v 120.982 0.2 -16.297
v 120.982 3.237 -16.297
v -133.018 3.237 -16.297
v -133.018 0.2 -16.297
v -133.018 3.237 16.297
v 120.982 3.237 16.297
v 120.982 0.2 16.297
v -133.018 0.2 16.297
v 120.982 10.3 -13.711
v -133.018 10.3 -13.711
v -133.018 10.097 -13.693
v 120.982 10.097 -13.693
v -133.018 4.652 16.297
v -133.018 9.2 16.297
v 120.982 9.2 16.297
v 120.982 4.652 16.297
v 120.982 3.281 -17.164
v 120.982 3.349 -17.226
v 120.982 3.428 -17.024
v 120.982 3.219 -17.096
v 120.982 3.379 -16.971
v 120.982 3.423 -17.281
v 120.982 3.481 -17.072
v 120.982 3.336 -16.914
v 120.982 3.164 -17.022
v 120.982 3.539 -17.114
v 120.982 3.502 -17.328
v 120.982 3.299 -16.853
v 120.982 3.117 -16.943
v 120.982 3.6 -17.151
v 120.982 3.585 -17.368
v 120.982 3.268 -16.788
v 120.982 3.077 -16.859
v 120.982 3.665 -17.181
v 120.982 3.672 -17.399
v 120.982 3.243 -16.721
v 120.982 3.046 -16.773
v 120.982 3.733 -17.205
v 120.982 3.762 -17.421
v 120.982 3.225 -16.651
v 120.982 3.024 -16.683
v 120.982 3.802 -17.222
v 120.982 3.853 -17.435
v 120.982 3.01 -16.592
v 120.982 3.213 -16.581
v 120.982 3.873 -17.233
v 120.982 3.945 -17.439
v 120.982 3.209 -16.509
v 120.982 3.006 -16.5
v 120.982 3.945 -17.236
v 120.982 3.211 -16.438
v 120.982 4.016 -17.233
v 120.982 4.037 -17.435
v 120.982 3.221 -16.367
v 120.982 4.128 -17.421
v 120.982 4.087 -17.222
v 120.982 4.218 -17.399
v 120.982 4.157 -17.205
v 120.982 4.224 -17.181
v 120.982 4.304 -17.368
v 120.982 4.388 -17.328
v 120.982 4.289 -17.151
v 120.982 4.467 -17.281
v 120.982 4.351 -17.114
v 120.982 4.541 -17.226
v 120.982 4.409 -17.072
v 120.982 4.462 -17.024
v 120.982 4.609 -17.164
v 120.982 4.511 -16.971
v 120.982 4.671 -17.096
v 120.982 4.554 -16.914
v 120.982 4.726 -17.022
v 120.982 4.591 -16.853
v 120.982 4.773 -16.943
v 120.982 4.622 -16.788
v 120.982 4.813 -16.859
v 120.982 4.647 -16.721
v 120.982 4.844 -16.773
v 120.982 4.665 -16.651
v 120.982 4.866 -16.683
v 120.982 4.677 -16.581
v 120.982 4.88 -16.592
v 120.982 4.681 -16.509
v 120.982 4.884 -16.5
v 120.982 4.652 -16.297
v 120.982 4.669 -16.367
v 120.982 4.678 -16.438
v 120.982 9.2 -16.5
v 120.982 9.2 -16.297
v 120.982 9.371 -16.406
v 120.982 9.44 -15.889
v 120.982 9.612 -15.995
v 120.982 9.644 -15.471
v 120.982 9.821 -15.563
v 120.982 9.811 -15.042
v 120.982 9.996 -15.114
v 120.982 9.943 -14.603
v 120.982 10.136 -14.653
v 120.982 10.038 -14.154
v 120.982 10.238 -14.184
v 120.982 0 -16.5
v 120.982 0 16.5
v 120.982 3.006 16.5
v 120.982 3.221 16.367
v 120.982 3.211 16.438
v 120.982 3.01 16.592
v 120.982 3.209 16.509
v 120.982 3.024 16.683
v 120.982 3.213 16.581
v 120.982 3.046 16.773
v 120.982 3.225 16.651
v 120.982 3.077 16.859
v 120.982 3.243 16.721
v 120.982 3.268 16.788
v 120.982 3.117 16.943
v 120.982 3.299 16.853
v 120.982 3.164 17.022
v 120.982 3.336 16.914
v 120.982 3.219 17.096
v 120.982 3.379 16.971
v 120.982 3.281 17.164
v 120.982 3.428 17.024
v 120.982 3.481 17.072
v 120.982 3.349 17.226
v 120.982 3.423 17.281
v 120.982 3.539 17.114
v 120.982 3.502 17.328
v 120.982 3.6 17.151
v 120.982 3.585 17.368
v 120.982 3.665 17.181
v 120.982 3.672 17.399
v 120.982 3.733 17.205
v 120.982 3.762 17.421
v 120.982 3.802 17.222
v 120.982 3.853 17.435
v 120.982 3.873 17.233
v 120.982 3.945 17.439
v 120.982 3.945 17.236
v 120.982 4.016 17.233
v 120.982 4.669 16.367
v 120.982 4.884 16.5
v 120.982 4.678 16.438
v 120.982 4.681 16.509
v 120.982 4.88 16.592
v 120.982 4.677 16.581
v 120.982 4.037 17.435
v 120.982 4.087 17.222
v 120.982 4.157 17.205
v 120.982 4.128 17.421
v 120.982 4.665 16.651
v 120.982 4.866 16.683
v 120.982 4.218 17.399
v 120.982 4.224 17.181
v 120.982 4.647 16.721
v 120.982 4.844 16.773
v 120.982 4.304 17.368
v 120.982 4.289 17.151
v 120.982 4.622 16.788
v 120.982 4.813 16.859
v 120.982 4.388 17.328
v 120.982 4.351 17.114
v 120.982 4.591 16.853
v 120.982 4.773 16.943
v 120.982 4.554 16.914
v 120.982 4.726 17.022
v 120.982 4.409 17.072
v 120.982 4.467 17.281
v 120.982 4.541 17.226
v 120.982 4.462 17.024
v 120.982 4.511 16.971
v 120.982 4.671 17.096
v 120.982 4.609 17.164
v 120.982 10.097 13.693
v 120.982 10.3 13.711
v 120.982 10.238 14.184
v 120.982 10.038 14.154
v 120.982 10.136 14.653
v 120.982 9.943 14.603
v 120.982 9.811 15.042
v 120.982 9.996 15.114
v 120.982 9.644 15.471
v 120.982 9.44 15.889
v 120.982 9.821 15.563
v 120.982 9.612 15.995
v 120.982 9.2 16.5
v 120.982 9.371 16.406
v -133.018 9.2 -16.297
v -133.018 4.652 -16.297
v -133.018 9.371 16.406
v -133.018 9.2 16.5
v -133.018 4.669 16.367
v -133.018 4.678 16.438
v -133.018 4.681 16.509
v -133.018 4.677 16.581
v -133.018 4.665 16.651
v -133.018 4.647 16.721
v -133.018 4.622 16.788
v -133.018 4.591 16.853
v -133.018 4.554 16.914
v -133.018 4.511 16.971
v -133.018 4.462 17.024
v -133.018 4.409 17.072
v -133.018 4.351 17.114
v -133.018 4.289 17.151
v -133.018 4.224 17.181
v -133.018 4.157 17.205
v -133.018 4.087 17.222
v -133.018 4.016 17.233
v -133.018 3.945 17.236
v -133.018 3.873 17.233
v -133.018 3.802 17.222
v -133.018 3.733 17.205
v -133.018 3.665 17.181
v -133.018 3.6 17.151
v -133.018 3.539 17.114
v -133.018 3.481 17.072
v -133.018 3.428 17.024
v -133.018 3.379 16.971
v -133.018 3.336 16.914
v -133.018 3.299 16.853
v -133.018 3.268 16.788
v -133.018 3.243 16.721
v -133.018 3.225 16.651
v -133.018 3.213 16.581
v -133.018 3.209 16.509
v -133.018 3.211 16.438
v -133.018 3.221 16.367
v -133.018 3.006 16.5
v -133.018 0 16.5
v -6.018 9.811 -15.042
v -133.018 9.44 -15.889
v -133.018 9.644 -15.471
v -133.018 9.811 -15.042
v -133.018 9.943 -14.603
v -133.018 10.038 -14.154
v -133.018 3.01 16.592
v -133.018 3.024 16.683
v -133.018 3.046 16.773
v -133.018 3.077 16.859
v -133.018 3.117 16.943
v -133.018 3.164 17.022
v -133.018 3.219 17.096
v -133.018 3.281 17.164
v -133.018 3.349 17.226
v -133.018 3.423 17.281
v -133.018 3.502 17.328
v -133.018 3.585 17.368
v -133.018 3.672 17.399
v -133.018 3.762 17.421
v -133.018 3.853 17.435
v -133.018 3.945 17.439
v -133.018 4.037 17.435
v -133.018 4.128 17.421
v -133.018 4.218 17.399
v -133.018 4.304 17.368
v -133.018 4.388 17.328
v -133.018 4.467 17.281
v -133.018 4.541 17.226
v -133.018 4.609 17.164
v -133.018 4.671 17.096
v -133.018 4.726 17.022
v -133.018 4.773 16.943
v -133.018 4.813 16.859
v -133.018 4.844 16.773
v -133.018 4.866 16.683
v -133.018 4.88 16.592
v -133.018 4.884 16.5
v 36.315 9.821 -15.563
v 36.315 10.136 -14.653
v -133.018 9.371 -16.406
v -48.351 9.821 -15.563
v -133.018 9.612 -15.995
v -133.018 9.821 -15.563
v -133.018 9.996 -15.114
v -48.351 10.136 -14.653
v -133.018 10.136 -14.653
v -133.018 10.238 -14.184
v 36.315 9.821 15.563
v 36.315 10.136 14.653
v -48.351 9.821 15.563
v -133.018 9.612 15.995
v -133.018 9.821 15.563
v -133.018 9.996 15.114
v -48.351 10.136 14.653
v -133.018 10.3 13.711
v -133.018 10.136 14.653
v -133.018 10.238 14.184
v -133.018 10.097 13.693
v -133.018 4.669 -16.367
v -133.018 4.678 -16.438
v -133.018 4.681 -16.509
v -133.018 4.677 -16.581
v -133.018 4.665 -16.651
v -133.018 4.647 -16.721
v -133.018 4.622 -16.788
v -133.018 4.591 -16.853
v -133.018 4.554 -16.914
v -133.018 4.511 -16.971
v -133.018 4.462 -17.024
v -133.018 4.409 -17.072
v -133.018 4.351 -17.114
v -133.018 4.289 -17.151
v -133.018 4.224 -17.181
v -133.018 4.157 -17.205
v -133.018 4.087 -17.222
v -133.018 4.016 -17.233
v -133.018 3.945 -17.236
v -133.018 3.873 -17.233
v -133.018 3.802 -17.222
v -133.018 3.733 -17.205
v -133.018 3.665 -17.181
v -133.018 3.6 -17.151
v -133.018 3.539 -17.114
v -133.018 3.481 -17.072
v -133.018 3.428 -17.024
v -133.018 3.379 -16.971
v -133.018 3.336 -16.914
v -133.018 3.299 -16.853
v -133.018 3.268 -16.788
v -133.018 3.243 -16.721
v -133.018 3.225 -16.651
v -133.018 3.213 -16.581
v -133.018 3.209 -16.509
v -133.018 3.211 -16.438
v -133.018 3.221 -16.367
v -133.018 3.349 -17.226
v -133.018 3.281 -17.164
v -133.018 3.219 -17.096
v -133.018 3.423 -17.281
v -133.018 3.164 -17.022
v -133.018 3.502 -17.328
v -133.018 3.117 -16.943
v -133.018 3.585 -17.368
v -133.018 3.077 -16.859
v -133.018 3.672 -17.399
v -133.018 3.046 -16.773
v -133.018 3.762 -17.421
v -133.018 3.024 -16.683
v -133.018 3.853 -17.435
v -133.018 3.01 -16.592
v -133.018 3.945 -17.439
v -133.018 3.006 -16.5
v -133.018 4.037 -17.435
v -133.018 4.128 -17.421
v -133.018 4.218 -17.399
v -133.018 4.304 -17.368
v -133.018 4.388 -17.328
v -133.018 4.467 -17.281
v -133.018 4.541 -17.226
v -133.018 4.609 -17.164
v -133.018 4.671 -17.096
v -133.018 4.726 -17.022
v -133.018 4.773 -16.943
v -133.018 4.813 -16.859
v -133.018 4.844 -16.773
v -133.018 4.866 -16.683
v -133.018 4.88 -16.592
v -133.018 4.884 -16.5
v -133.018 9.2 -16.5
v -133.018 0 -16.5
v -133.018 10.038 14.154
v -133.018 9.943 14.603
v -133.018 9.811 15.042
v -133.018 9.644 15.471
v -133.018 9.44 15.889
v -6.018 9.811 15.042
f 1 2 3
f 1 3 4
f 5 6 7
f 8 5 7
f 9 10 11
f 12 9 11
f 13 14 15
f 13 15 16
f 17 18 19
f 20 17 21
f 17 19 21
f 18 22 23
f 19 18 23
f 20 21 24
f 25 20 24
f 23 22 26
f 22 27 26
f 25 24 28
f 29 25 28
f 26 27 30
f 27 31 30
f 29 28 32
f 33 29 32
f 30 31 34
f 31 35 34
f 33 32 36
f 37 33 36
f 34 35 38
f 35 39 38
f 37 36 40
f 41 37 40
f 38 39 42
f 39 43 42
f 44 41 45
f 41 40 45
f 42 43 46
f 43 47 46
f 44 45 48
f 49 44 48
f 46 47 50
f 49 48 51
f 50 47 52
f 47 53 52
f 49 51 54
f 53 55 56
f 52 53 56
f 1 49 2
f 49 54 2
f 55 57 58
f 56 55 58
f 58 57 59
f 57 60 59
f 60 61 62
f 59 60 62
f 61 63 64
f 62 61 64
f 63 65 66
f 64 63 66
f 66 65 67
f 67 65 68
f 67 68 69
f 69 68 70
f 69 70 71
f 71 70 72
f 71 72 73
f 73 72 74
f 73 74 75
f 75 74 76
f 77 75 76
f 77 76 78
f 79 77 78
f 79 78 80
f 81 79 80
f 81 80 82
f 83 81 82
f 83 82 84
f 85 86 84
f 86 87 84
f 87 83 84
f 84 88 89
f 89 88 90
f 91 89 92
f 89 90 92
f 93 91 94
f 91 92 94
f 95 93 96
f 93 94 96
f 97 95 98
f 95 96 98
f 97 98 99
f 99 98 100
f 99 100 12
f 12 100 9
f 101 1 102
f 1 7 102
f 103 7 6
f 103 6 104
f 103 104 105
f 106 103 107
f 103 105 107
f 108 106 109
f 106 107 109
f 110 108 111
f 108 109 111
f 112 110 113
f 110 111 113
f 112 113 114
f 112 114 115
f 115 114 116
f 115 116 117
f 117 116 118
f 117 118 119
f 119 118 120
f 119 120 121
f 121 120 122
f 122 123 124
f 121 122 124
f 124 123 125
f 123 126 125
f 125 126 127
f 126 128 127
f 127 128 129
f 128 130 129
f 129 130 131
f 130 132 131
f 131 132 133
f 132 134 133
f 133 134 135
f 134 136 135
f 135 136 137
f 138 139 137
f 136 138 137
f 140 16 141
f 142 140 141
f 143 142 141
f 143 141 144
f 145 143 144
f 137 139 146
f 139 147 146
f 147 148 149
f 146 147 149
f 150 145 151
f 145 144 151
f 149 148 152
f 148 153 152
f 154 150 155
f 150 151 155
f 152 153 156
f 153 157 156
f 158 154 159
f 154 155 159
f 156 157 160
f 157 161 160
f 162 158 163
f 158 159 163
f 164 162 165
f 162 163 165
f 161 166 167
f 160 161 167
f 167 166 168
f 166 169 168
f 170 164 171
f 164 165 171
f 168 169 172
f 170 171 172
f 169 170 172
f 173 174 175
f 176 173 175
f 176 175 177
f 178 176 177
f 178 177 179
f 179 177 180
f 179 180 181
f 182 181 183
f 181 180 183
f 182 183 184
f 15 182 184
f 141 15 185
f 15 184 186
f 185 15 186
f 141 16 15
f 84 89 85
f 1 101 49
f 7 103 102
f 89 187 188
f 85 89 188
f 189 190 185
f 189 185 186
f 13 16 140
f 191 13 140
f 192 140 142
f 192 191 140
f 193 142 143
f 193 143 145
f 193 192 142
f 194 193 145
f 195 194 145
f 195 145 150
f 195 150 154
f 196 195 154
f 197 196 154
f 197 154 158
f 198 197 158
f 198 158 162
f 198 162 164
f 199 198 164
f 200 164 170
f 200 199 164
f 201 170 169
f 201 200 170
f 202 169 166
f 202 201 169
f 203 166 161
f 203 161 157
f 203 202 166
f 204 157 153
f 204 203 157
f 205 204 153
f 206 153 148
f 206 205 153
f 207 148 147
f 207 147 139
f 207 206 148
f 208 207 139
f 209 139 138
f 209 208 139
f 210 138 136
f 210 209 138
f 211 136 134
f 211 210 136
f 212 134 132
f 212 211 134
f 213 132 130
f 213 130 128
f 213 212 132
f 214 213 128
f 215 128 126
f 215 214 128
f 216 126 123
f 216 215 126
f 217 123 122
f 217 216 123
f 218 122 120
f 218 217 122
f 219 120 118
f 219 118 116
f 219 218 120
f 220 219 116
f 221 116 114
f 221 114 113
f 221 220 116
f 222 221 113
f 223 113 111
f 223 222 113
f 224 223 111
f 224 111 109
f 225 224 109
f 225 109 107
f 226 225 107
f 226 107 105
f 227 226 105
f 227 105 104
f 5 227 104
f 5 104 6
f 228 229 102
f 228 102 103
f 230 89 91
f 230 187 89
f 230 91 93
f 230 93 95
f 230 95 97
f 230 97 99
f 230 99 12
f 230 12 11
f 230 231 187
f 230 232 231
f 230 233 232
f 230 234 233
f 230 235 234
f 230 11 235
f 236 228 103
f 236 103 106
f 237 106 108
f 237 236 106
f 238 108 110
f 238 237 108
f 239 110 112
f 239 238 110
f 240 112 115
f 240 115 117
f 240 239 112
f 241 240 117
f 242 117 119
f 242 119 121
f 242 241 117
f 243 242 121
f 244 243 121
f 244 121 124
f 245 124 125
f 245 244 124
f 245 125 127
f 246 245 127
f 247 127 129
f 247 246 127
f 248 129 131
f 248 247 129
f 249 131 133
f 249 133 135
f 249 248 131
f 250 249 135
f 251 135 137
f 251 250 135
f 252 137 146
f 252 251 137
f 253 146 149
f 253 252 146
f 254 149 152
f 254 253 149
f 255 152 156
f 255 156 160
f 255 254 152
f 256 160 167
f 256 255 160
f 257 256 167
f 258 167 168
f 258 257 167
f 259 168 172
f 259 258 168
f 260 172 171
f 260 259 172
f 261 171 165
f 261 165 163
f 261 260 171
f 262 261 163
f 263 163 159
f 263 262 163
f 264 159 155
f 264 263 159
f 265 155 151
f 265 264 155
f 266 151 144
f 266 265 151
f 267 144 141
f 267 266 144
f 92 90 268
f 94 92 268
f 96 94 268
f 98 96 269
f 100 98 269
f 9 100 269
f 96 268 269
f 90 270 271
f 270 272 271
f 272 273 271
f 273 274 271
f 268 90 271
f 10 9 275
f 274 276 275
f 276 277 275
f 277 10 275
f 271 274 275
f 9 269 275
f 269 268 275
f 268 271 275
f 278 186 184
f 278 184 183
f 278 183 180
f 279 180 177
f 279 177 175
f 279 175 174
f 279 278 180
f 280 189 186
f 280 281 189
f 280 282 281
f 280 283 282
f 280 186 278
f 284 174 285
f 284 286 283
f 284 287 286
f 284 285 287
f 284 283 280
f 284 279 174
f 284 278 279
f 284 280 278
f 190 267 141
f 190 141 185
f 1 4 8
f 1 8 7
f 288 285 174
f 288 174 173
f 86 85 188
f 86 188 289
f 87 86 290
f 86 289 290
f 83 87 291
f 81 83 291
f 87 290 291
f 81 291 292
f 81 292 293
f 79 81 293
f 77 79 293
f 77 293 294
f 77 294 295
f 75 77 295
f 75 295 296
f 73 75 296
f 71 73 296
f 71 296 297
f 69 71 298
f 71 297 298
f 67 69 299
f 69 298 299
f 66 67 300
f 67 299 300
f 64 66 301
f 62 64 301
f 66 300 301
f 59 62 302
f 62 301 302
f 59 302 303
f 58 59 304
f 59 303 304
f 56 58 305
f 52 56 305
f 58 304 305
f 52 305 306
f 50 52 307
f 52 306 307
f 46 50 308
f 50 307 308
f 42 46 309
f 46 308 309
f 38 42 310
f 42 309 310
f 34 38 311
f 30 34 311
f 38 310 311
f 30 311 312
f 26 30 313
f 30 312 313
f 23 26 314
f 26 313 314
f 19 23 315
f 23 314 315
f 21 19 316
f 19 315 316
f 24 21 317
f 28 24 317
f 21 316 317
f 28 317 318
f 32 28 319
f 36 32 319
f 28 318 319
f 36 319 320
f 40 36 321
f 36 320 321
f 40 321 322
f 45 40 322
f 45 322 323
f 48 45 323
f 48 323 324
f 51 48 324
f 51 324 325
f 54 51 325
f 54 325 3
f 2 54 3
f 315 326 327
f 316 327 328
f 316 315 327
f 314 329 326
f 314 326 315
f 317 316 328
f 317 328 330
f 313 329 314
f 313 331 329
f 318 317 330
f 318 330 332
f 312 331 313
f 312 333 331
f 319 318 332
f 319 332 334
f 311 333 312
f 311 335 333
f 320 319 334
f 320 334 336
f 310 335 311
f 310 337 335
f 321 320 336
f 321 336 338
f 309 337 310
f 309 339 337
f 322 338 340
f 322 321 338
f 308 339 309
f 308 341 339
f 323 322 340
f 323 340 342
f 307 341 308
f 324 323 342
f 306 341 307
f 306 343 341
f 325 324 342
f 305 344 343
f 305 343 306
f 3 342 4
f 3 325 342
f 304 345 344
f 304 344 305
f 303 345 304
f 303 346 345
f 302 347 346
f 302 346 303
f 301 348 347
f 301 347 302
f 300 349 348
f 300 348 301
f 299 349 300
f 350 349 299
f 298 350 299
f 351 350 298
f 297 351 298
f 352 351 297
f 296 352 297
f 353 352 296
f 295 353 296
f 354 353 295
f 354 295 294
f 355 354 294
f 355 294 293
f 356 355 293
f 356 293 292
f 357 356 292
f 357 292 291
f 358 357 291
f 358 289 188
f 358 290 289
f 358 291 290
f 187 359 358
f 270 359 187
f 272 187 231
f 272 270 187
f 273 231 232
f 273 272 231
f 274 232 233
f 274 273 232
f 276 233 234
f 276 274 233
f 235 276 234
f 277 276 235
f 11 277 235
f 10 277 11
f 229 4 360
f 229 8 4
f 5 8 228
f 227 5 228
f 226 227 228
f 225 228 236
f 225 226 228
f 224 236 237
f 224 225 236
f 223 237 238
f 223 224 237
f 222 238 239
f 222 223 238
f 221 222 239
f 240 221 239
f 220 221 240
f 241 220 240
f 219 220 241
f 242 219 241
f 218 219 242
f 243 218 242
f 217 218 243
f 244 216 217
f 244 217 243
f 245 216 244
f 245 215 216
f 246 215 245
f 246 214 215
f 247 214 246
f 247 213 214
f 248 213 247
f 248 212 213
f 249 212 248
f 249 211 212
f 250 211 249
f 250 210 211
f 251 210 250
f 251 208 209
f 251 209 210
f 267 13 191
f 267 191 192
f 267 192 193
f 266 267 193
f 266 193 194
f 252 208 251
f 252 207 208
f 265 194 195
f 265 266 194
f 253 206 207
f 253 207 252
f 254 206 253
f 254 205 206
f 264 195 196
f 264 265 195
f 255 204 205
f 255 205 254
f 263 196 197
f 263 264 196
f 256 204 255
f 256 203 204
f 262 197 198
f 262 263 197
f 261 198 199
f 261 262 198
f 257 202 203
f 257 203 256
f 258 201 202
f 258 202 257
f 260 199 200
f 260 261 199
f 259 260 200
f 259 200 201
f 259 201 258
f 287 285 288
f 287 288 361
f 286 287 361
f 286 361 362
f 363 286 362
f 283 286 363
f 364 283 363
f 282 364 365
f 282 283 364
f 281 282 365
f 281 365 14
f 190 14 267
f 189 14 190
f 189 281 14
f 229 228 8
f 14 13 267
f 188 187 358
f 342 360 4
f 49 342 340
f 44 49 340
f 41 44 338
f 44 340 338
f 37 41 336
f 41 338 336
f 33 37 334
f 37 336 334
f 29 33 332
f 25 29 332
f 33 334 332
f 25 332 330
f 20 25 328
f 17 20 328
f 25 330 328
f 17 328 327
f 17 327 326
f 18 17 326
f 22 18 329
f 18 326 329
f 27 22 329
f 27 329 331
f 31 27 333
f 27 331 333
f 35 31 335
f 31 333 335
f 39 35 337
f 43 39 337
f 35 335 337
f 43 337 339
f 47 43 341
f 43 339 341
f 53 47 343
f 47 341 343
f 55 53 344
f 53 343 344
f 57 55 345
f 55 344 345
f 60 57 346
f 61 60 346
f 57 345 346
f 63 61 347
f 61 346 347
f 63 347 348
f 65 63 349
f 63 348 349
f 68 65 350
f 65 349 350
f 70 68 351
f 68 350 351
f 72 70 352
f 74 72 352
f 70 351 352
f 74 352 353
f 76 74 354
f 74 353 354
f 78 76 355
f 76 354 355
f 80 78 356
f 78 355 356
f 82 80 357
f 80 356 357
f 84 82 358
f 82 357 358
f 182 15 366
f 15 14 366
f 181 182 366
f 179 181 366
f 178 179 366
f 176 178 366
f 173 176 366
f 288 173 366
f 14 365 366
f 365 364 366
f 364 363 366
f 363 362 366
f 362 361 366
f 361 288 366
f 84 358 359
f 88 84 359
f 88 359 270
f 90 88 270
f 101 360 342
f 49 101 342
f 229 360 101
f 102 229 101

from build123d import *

# Parameters (mm, degrees)
SKETCH1_W           = 254
SKETCH1_H           = 33
BOSS_EXTRUDE1_DEPTH = 0.2
BOSS_EXTRUDE2_DEPTH = 254


with BuildPart() as part:
    # Sketch1 → Boss-Extrude1 (new body)
    with BuildSketch(Plane(origin=(0, 0, 0), x_dir=(1, 0, 0), z_dir=(0, 1, 0))):
        with Locations((-6.018162295, 0)):
            Rectangle(SKETCH1_W, SKETCH1_H)
    extrude(amount=BOSS_EXTRUDE1_DEPTH)

    # Sketch4 → Boss-Extrude2 (add)
    with BuildSketch(Plane(origin=(-133.018162295, 0, 0), x_dir=(0, 0, -1), z_dir=(1, 0, 0))):
        with BuildLine():
            Line((16.5, 0.2), (16.5, 3.005611905))
            ThreePointArc((16.5, 3.005611905), (17.439298034, 3.944909939), (16.5, 4.884207973))
            Line((16.5, 4.884207973), (16.5, 9.2))
            Line((16.5, 9.2), (16.406492637, 9.371049015))
            add(Edge.make_bspline(
                [(16.406492637, 9.371049015), (15.606591952, 9.884020198), (14.657842295, 10.216248434), (13.711270965, 10.299814324)],
                knots=[0, 0, 0, 0, 1, 1, 1, 1], degree=3))
            Line((13.711270965, 10.299814324), (13.693401418, 10.097401579))
            add(Edge.make_bspline(
                [(16.2968, 9.2), (15.089651085, 9.974136863), (13.693401418, 10.097401579)],
                knots=[0, 0, 0, 1, 1, 1], degree=2))
            Line((16.2968, 9.2), (16.2968, 4.652405576))
            ThreePointArc((16.2968, 4.652405576), (17.236098034, 3.944909939), (16.2968, 3.237414303))
            Line((16.2968, 3.237414303), (16.2968, 0.2))
            Line((16.2968, 0.2), (16.5, 0.2))
        make_face()
    boss_extrude2 = extrude(amount=BOSS_EXTRUDE2_DEPTH)

    # Mirror1: Boss-Extrude2 across plane
    add(boss_extrude2.mirror(Plane.XY))


solid = part.part
